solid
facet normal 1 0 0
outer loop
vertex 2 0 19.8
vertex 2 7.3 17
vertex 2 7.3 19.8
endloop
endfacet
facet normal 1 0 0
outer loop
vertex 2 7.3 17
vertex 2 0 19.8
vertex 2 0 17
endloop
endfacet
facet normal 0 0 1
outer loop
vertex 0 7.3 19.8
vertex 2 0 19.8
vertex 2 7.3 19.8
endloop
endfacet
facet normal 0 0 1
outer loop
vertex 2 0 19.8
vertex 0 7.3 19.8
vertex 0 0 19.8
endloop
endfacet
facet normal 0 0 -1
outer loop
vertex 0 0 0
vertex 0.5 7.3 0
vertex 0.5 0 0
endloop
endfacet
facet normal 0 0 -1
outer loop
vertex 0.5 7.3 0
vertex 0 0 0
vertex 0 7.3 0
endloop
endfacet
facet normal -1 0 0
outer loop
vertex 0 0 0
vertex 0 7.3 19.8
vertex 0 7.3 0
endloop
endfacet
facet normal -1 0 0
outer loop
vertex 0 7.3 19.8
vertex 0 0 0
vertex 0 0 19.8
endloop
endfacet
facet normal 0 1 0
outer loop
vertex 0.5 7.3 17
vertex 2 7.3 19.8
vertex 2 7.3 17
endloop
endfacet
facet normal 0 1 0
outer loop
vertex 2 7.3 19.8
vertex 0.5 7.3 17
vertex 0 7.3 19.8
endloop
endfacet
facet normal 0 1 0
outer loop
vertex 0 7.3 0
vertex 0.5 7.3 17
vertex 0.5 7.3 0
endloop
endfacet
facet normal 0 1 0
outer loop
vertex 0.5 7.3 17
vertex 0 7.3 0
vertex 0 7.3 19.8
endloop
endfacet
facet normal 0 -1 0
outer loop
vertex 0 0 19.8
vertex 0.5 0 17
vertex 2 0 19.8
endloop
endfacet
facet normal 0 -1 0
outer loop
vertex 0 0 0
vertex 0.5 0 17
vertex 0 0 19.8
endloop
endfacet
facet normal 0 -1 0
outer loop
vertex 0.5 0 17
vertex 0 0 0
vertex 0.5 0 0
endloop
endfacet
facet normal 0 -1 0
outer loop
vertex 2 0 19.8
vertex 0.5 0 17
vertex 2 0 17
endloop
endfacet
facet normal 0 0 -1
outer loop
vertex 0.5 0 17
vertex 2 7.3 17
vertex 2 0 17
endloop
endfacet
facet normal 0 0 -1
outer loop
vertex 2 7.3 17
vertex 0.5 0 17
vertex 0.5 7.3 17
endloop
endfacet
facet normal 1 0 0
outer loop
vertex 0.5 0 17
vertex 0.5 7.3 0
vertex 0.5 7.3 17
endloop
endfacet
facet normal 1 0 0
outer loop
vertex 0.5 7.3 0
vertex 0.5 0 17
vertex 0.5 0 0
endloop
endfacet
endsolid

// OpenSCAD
$fn = 50;

//battholder(0, 0, 0);
battConnector(0, 0, 0);

// prostranstvo dlia kontaktov batarei
module battConnector(xpos, ypos, zpos) {
    w = 2;
    l = 7.3;
    h = 19.8;
    smallW = 0.5;
    smallH = 17;
    translate([xpos, ypos, zpos]) {
        difference() {
            cube([w, l, h]);
            translate([smallW, 0, 0]) {
                cube([w - smallW, l ,smallH]);
            }
        }
    }
}

// battery holder
module battholder(xpos, ypos, zpos) {
    // battery params
    batL = 65;
    batDiam = 18.5;
    //holder params
    w = batDiam * 2;
    l = batDiam / 2;
    // openscad paklaida 0.01
    hdeep = 4.01;
    translate([xpos, ypos, zpos]) {
        difference() {
            cube([hdeep, w, l]);
           translate([0, batDiam / 2, 0]) {
                rotate([0, 90, 0]) {
                    cylinder(h = hdeep, r = l);
                }
            }
            translate([0, (batDiam + l), 0]) {
                rotate([0, 90, 0]) {
                    cylinder(h = hdeep, r =l);
                }
            }
        }
    }
}
